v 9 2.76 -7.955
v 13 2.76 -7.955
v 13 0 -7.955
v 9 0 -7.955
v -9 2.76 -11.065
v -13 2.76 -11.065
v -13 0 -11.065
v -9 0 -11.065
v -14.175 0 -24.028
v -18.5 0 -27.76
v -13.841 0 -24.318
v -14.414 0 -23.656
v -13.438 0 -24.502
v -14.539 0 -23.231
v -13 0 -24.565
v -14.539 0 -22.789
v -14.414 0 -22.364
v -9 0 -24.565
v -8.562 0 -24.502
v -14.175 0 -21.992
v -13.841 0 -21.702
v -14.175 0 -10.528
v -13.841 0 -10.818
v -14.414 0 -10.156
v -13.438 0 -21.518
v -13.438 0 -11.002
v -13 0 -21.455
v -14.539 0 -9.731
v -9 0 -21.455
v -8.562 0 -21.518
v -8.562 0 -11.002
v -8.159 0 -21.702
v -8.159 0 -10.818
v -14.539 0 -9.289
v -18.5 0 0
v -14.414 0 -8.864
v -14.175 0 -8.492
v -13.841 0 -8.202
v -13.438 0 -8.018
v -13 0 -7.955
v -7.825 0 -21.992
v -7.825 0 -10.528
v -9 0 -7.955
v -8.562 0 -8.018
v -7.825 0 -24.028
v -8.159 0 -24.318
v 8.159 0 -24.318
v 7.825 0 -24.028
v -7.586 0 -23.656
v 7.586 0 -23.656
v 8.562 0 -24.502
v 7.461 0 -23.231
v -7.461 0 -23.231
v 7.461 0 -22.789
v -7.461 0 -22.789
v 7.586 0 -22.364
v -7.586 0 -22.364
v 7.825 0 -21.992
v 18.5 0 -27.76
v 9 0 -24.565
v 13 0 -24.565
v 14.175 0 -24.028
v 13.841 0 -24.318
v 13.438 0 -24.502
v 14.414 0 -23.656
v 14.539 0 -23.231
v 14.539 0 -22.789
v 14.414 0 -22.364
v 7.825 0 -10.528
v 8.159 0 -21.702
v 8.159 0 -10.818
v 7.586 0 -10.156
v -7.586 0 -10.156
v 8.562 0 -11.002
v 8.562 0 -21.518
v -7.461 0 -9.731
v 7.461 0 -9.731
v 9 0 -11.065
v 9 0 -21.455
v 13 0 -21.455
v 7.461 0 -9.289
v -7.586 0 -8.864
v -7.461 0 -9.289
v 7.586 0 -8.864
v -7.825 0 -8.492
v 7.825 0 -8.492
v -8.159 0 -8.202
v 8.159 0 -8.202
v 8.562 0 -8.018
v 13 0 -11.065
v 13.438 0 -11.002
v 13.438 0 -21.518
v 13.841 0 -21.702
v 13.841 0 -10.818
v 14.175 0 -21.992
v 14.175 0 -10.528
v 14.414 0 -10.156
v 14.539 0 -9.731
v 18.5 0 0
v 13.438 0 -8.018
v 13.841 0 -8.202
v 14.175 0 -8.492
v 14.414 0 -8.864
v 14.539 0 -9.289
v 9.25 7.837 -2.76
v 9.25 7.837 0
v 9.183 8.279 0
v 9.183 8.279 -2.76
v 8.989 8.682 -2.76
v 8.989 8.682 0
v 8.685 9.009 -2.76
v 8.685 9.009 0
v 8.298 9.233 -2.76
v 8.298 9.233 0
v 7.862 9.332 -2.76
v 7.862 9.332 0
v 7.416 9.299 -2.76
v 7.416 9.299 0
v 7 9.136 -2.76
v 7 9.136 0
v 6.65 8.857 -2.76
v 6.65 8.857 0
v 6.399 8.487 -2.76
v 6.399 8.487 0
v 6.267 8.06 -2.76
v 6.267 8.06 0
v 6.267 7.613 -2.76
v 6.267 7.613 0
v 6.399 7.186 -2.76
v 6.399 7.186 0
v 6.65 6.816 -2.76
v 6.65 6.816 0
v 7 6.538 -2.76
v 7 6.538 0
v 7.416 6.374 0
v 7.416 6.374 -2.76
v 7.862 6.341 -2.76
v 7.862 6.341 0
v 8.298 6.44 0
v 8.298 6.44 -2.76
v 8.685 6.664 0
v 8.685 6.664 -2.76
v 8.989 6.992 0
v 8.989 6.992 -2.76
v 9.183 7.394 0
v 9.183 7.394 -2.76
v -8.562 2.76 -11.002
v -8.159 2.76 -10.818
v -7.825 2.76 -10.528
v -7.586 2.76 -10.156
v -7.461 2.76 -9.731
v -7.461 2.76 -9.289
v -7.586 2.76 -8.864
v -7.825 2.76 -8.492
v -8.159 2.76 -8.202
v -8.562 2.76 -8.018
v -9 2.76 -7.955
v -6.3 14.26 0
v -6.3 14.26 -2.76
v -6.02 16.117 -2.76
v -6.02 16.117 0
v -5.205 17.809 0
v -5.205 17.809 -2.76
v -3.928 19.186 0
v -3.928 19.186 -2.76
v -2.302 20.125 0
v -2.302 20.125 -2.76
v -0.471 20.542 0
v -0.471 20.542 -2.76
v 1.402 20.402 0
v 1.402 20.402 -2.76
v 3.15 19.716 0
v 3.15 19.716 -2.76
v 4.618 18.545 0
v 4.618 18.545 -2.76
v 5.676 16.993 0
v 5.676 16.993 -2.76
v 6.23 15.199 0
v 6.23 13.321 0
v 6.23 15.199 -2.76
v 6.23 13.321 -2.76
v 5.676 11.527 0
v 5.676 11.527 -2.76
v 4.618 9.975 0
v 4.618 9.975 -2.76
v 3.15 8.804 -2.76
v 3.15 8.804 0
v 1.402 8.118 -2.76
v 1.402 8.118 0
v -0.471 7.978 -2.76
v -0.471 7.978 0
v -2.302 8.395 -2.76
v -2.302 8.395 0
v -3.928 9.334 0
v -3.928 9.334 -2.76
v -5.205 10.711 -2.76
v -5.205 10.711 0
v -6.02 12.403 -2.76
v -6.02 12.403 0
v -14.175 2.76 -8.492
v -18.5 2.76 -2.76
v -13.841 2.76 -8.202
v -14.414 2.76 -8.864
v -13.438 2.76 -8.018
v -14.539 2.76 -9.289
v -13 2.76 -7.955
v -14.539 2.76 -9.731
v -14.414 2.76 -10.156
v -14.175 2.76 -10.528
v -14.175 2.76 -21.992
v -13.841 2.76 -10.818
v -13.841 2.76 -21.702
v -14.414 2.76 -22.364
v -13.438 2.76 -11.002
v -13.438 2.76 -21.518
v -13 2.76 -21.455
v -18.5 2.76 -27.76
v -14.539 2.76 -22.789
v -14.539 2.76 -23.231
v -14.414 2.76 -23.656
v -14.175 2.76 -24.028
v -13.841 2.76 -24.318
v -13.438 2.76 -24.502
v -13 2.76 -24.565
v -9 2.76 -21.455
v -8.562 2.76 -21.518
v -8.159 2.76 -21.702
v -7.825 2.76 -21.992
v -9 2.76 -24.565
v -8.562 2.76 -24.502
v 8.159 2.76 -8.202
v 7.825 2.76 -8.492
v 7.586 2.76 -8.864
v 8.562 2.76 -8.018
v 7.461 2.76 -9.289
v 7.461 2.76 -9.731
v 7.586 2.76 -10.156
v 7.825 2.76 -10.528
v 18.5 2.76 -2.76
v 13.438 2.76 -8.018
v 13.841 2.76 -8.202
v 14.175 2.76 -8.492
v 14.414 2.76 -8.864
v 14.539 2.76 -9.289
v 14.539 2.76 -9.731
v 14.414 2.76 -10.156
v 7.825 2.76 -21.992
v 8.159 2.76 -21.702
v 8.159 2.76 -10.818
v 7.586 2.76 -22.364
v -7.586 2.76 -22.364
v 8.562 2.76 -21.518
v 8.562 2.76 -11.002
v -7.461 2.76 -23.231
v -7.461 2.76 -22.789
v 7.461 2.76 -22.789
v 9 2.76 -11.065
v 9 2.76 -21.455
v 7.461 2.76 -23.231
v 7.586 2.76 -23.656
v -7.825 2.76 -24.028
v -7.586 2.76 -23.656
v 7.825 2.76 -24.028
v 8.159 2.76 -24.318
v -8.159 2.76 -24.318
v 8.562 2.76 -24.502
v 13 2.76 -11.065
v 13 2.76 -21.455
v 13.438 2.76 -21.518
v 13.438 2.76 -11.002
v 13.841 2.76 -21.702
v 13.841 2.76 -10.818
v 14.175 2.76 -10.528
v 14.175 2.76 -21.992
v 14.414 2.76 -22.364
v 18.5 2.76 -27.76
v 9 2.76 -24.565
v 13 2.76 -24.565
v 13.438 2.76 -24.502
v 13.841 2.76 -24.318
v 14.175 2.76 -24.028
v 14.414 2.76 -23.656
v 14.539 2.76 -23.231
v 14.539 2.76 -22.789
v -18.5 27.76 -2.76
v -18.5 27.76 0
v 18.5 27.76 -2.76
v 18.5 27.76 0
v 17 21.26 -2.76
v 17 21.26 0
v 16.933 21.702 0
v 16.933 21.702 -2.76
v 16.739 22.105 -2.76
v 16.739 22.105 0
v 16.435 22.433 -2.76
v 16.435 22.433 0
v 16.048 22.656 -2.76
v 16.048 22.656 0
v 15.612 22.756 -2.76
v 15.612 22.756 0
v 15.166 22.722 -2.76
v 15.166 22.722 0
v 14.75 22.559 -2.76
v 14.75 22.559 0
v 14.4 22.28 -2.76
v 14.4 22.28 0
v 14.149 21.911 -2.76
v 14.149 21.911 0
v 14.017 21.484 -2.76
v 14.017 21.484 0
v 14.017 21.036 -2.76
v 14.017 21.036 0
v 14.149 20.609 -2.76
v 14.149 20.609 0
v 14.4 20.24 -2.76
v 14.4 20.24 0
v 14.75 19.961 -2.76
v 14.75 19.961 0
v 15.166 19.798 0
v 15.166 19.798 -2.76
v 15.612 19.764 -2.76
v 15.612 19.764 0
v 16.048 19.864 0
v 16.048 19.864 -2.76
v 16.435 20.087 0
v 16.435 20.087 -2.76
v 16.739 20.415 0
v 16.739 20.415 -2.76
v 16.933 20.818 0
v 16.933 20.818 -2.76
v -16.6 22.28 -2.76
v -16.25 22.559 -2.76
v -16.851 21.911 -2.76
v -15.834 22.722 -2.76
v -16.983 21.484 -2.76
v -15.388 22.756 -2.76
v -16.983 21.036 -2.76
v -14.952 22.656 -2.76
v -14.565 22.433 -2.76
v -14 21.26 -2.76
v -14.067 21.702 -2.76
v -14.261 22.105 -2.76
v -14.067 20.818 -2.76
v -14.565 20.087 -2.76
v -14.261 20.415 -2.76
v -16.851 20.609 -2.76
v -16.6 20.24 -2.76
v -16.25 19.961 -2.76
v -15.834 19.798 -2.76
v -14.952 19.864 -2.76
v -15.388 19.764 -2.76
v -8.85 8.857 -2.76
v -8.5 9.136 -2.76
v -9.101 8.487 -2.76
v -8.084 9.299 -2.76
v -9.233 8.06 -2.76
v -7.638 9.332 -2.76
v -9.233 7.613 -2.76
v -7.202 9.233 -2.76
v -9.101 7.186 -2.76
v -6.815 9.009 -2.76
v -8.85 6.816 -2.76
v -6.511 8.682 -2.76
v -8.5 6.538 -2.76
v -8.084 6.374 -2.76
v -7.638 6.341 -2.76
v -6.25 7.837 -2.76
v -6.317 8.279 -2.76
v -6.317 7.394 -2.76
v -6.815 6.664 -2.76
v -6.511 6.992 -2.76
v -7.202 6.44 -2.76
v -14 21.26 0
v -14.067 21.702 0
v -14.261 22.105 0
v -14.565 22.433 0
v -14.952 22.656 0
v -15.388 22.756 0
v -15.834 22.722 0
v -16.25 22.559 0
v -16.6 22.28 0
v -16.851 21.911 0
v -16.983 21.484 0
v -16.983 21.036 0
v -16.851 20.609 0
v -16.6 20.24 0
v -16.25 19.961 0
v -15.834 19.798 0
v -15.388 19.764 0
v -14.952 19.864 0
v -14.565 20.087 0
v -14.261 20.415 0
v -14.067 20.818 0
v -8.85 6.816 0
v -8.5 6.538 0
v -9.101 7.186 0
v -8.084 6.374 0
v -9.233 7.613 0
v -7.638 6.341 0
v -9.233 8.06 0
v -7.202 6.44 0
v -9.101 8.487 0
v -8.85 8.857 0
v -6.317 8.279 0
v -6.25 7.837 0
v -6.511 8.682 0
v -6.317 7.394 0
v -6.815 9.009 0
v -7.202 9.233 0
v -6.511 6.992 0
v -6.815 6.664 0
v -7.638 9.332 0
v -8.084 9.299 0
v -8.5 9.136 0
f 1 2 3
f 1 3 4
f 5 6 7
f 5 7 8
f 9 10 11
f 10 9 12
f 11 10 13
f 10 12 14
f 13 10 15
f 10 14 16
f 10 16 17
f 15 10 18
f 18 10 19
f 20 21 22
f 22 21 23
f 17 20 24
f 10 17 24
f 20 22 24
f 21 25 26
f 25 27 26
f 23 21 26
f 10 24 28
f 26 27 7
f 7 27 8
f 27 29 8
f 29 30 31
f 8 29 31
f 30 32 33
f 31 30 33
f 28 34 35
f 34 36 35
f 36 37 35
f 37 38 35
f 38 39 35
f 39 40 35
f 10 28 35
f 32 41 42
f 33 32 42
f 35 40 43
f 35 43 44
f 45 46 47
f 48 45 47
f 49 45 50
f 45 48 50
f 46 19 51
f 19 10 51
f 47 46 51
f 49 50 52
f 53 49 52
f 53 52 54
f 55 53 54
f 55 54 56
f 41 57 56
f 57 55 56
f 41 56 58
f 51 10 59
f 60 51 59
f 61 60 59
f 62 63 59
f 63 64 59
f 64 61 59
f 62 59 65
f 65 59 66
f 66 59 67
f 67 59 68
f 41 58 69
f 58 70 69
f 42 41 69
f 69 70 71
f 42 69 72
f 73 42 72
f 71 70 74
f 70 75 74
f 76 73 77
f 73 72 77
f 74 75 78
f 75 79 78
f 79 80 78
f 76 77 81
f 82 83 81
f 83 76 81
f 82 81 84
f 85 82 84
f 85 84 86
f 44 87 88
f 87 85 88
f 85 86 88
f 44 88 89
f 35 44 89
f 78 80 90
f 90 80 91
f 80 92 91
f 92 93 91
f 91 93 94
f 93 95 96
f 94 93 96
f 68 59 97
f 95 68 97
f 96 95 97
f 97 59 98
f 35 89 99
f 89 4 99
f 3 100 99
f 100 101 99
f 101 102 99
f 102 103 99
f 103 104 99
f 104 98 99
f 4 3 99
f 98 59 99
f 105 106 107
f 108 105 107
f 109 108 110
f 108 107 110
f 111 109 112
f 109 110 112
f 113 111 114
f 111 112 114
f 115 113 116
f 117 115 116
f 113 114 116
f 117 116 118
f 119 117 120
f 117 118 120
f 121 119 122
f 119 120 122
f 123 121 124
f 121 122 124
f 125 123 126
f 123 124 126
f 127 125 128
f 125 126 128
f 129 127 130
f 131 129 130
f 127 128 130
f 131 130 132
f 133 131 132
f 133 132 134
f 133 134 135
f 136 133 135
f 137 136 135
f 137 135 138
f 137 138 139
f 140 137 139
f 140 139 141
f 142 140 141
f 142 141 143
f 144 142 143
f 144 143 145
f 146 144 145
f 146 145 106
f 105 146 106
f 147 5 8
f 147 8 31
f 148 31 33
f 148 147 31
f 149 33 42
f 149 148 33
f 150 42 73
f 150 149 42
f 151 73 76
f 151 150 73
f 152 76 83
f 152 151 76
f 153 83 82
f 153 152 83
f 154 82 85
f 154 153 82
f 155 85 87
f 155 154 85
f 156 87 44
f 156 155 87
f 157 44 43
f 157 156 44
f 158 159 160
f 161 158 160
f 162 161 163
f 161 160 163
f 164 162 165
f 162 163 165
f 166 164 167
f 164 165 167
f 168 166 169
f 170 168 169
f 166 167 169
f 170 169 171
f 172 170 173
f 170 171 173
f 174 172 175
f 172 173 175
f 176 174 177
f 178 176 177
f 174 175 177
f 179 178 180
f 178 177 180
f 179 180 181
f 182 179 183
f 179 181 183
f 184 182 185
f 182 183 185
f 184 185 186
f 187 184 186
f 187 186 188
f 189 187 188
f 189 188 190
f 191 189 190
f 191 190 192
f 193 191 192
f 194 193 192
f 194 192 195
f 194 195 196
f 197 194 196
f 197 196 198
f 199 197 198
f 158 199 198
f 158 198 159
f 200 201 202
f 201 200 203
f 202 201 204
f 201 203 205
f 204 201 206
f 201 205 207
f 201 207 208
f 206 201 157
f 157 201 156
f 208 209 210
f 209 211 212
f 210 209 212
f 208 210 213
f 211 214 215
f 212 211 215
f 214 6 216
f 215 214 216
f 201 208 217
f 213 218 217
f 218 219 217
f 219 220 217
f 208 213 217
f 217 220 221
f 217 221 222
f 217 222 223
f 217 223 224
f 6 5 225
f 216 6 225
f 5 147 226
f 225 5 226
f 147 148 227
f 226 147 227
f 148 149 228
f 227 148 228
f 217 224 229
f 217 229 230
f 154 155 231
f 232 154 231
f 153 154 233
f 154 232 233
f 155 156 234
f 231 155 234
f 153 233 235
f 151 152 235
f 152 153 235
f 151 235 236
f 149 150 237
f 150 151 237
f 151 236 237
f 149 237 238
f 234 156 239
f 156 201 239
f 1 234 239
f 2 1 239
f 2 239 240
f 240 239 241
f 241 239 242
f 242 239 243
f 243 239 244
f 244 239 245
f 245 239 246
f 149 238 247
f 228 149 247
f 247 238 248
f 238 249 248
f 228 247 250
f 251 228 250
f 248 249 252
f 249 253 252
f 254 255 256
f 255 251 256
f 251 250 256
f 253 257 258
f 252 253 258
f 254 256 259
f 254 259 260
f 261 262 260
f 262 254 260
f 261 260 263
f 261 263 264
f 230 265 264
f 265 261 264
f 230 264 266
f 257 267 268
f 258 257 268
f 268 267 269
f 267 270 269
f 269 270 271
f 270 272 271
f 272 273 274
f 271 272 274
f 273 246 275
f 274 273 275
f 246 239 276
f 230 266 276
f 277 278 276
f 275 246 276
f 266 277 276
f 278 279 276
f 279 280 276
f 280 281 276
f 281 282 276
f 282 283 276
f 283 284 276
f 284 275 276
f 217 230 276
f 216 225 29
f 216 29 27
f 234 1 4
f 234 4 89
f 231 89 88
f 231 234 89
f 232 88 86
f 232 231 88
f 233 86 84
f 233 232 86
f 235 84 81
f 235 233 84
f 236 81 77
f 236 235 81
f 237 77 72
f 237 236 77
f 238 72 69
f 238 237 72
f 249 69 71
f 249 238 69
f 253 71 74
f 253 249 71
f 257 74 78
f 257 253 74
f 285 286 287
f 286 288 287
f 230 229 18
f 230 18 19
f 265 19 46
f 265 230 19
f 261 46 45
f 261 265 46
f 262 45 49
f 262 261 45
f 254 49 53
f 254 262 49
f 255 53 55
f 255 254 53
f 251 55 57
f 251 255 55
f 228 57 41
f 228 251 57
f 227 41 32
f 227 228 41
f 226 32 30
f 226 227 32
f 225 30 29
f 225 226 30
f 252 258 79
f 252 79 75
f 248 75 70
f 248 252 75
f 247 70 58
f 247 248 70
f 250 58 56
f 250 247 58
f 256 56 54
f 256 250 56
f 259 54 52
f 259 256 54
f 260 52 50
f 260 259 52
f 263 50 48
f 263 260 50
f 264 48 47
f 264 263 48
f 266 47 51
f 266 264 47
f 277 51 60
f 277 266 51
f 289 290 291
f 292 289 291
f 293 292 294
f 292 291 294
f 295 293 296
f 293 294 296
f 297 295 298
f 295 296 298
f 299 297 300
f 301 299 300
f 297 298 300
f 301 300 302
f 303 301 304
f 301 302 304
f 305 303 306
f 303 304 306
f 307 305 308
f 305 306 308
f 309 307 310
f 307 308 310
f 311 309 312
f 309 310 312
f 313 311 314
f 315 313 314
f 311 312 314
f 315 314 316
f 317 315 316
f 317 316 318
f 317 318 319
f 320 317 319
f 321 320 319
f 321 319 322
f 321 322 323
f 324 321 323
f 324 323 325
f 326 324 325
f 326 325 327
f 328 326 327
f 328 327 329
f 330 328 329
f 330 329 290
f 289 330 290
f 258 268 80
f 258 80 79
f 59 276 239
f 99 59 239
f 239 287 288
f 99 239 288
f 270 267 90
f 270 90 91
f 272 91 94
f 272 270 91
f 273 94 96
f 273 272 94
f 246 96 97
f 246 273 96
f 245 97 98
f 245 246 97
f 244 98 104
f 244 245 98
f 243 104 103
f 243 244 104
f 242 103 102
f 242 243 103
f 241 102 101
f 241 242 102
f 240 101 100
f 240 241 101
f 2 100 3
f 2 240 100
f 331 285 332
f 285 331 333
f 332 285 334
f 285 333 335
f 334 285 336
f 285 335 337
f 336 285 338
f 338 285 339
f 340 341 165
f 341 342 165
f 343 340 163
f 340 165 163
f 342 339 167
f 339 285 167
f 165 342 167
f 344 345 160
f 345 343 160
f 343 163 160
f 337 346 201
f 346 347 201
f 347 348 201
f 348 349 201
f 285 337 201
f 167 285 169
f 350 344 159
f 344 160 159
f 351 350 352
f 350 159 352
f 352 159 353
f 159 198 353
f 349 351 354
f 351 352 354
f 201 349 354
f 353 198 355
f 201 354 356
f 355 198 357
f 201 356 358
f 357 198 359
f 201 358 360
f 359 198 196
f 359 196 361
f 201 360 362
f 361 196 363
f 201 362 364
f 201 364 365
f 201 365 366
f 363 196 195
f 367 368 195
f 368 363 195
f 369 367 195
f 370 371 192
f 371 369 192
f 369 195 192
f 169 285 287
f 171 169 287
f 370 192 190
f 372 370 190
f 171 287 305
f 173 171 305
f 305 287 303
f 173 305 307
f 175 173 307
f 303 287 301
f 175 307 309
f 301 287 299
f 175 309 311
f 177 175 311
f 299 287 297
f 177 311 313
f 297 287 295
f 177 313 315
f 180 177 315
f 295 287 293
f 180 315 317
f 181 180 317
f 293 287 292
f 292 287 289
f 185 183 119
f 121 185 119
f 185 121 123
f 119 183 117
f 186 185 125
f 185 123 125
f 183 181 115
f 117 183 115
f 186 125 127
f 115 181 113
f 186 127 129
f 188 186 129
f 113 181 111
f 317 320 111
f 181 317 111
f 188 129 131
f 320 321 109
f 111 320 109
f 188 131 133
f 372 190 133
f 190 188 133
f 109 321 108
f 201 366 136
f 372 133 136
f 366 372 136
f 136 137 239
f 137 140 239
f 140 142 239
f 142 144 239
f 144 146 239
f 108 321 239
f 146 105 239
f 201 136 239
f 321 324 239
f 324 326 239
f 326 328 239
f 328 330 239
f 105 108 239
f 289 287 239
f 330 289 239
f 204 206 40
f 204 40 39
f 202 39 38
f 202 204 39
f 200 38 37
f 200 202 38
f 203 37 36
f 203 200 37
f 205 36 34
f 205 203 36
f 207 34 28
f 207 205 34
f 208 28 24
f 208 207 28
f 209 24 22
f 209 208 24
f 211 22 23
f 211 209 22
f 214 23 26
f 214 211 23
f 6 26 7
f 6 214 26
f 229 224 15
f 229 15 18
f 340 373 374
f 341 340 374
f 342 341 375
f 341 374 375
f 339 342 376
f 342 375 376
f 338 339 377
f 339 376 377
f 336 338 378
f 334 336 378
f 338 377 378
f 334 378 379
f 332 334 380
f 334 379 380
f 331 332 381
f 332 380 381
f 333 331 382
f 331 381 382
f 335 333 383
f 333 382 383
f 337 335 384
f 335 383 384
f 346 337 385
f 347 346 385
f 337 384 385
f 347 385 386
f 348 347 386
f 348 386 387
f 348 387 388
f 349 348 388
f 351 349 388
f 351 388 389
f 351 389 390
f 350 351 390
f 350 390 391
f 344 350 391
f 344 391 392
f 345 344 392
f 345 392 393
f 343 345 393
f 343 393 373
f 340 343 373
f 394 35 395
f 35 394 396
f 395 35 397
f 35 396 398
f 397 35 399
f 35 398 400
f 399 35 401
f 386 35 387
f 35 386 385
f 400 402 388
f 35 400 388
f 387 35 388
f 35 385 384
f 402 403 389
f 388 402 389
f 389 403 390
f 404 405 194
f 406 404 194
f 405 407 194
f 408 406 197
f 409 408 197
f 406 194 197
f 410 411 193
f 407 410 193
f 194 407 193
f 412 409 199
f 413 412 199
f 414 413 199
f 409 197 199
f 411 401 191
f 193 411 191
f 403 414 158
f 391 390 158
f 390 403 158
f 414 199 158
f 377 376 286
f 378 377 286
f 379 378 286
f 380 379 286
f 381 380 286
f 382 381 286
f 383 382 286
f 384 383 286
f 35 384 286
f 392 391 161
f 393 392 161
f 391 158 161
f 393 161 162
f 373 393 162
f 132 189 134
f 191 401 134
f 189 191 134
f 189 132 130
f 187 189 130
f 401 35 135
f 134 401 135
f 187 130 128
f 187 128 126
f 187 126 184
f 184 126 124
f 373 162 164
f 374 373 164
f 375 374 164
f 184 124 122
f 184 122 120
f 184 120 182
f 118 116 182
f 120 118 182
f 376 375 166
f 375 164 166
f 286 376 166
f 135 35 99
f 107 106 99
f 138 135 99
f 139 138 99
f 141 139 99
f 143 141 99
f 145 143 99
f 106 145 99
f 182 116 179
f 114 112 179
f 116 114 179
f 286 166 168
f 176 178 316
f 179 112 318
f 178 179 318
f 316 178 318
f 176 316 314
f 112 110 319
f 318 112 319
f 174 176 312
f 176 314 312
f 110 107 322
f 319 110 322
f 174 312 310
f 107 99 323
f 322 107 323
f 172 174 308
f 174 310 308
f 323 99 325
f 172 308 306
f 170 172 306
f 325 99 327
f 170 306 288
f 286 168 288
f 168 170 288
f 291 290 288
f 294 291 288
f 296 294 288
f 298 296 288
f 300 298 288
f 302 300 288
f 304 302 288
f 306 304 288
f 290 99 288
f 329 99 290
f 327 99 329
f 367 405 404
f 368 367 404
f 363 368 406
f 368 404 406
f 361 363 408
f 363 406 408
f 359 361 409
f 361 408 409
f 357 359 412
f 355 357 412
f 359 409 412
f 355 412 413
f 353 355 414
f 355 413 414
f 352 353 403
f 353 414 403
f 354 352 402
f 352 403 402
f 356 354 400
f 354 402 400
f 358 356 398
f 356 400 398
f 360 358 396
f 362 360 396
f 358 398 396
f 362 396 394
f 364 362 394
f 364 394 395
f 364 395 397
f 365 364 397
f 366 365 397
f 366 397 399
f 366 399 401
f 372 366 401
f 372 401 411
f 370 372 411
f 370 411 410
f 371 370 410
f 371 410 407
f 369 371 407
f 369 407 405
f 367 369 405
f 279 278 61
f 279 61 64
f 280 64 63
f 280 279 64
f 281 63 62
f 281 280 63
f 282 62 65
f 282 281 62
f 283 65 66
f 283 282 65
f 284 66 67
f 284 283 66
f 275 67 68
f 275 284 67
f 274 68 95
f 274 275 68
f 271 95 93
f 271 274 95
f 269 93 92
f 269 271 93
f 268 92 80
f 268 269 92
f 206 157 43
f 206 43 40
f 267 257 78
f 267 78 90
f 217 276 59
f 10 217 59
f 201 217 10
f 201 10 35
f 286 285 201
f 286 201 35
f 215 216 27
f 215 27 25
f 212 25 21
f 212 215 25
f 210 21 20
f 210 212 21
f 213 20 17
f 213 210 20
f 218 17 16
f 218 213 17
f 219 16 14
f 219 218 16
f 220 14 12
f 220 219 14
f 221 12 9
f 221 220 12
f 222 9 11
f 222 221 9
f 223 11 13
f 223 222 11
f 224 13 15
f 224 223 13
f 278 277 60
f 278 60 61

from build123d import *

# Parameters (mm, degrees)
BOSS_EXTRUDE1_DEPTH          = 18.5
SKETCH2_R                    = 6.3
CUT_EXTRUDE1_DEPTH           = 3.76
F_3_0_3_DIAMETER_HOLE1_D     = 3
F_3_0_3_DIAMETER_HOLE1_DEPTH = 10
F_3_0_3_DIAMETER_HOLE1_TIP   = 0.901290929
CUT_EXTRUDE2_DEPTH           = 3.76


with BuildPart() as part:
    # Sketch1 → Boss-Extrude1 (new body, symmetric)
    with BuildSketch(Plane(origin=(0, 0, 0), x_dir=(0, 0, -1), z_dir=(1, 0, 0))):
        Polygon((0, 0), (0, 27.76), (2.76, 27.76), (2.76, 2.76), (27.76, 2.76), (27.76, 0), align=None)
    extrude(amount=BOSS_EXTRUDE1_DEPTH, both=True)

    # Sketch2 → Cut-Extrude1 (cut, through all)
    with BuildSketch(Plane(origin=(0, 0, -2.76), x_dir=(-1, 0, 0), z_dir=(0, 0, -1))):
        with Locations((0, 14.26)):
            Circle(SKETCH2_R)
    extrude(amount=-CUT_EXTRUDE1_DEPTH, mode=Mode.SUBTRACT)

    # Ø3.0 (3) Diameter Hole1
    with Locations(Plane(origin=(0, 0, -2.76), x_dir=(-1, 0, 0), z_dir=(0, 0, -1))):
        with Locations((15.5, 21.26), (7.75, 7.836606241), (-7.75, 7.836606241), (-15.5, 21.26)):
            Hole(F_3_0_3_DIAMETER_HOLE1_D / 2, depth=F_3_0_3_DIAMETER_HOLE1_DEPTH)
            with Locations((0, 0, -(F_3_0_3_DIAMETER_HOLE1_DEPTH + F_3_0_3_DIAMETER_HOLE1_TIP / 2))):  # 118° drill point
                Cone(0, F_3_0_3_DIAMETER_HOLE1_D / 2, F_3_0_3_DIAMETER_HOLE1_TIP, mode=Mode.SUBTRACT)

    # Sketch5 → Cut-Extrude2 (cut, through all)
    with BuildSketch(Plane(origin=(0, 2.76, 0), x_dir=(1, 0, 0), z_dir=(0, 1, 0))):
        with BuildLine():
            Line((-13, 24.565), (-9, 24.565))
            ThreePointArc((-9, 24.565), (-7.445, 23.01), (-9, 21.455))
            Line((-9, 21.455), (-13, 21.455))
            ThreePointArc((-13, 21.455), (-14.555, 23.01), (-13, 24.565))
        make_face()
        with BuildLine():
            Line((-13, 11.065), (-9, 11.065))
            ThreePointArc((-9, 11.065), (-7.445, 9.51), (-9, 7.955))
            Line((-9, 7.955), (-13, 7.955))
            ThreePointArc((-13, 7.955), (-14.555, 9.51), (-13, 11.065))
        make_face()
        with BuildLine():
            Line((9, 11.065), (13, 11.065))
            ThreePointArc((13, 11.065), (14.555, 9.51), (13, 7.955))
            Line((13, 7.955), (9, 7.955))
            ThreePointArc((9, 7.955), (7.445, 9.51), (9, 11.065))
        make_face()
        with BuildLine():
            Line((9, 24.565), (13, 24.565))
            ThreePointArc((13, 24.565), (14.555, 23.01), (13, 21.455))
            Line((13, 21.455), (9, 21.455))
            ThreePointArc((9, 21.455), (7.445, 23.01), (9, 24.565))
        make_face()
    extrude(amount=-CUT_EXTRUDE2_DEPTH, mode=Mode.SUBTRACT)


solid = part.part
